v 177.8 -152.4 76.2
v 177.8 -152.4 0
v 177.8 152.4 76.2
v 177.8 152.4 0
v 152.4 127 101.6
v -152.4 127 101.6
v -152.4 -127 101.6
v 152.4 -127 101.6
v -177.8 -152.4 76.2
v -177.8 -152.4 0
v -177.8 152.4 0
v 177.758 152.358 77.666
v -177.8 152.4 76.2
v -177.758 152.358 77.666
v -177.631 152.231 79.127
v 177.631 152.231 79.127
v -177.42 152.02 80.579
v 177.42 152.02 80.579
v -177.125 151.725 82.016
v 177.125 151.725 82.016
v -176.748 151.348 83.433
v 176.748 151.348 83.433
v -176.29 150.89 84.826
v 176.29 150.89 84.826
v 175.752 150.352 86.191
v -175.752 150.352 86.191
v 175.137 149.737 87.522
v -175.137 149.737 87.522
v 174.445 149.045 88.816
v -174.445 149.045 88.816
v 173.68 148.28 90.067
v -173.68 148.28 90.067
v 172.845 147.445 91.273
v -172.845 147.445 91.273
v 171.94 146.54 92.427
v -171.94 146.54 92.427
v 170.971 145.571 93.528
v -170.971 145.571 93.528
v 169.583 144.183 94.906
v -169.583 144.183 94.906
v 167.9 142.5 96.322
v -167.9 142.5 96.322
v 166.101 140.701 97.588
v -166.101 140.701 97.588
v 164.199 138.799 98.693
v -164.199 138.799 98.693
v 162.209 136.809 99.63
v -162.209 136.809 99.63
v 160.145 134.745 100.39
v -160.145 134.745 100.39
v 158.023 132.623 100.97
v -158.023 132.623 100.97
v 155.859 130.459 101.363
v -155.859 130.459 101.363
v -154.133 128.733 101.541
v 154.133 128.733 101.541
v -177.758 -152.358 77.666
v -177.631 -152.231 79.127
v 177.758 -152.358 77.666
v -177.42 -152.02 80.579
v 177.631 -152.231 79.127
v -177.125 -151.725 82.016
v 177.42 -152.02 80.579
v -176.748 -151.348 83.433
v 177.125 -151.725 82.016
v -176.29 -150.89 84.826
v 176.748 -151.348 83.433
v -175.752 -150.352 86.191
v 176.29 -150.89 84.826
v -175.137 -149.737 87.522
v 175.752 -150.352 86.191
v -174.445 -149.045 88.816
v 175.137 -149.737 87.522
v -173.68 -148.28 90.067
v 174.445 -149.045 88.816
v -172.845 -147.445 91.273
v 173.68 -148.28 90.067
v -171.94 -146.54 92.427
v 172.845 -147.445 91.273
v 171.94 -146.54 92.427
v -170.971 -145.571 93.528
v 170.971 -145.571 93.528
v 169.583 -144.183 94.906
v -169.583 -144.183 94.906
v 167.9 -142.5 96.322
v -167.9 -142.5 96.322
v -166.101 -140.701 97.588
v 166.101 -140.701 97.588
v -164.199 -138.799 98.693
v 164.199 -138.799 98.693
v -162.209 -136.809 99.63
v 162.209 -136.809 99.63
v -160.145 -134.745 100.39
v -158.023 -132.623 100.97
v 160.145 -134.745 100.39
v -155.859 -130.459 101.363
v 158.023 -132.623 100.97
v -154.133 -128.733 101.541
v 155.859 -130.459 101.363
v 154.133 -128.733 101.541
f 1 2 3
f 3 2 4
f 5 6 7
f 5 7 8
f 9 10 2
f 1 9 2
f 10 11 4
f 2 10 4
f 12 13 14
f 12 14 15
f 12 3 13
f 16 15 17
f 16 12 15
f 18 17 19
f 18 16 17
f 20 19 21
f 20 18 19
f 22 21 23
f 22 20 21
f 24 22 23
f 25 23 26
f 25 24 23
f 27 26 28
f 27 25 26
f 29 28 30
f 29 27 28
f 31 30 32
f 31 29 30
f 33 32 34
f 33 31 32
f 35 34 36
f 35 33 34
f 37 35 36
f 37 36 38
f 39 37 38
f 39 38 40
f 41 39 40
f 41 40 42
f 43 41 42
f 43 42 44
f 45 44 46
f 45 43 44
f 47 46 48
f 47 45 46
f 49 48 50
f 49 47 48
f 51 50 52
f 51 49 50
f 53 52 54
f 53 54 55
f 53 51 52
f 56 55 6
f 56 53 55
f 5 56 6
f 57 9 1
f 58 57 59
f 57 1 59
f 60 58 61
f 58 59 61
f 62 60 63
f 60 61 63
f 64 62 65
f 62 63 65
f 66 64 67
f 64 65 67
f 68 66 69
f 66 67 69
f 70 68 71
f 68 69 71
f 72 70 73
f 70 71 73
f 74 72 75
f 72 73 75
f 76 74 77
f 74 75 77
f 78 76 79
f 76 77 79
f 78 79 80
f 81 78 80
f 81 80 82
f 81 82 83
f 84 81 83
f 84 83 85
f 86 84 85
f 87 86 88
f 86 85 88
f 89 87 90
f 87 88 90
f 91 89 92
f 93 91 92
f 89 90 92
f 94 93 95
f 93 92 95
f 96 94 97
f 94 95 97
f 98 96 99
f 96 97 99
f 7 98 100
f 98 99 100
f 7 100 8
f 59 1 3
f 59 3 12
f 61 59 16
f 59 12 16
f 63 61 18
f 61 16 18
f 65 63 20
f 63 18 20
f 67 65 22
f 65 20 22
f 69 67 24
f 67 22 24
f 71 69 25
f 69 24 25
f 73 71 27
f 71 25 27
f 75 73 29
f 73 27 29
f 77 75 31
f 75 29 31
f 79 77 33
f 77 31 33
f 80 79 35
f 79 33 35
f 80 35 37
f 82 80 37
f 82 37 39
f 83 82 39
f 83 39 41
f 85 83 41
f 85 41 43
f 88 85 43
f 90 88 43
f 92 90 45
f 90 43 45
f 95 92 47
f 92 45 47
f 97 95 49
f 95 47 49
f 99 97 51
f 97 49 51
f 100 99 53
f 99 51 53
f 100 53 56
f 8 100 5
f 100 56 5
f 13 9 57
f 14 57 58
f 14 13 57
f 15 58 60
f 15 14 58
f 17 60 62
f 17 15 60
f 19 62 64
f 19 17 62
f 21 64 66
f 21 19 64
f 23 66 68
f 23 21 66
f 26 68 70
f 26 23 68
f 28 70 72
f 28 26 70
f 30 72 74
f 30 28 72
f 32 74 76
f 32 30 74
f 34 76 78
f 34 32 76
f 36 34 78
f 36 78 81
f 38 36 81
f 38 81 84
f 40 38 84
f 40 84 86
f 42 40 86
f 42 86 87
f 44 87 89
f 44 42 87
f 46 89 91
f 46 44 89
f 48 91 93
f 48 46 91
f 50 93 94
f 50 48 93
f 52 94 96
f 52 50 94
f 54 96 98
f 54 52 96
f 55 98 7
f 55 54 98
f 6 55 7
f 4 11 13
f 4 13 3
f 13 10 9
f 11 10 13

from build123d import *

# Parameters (mm, degrees)
F0_W     = 355.6
F0_H     = 304.8
F1_DEPTH = 25.4
F2_W     = 355.6
F2_H     = 304.8
F3_DEPTH = 76.2
F4_R     = 25.4


with BuildPart() as f1:
    # F0 (on Top) → F1 (new body)
    with BuildSketch(Plane.XY):
        Rectangle(F0_W, F0_H)
    extrude(amount=F1_DEPTH)

    # F2 (on face) → F3 (join)
    with BuildSketch(Plane.XY.offset(25.4)):
        Rectangle(F2_W, F2_H)
    extrude(amount=F3_DEPTH)

    # F4
    f4_edges = [f1.edges().sort_by_distance(p)[0] for p in [
        (-177.8, 0, 101.6),
        (0, -152.4, 101.6),
        (177.8, 0, 101.6),
        (0, 152.4, 101.6),
    ]]
    fillet(f4_edges, radius=F4_R)


solid = f1.part
